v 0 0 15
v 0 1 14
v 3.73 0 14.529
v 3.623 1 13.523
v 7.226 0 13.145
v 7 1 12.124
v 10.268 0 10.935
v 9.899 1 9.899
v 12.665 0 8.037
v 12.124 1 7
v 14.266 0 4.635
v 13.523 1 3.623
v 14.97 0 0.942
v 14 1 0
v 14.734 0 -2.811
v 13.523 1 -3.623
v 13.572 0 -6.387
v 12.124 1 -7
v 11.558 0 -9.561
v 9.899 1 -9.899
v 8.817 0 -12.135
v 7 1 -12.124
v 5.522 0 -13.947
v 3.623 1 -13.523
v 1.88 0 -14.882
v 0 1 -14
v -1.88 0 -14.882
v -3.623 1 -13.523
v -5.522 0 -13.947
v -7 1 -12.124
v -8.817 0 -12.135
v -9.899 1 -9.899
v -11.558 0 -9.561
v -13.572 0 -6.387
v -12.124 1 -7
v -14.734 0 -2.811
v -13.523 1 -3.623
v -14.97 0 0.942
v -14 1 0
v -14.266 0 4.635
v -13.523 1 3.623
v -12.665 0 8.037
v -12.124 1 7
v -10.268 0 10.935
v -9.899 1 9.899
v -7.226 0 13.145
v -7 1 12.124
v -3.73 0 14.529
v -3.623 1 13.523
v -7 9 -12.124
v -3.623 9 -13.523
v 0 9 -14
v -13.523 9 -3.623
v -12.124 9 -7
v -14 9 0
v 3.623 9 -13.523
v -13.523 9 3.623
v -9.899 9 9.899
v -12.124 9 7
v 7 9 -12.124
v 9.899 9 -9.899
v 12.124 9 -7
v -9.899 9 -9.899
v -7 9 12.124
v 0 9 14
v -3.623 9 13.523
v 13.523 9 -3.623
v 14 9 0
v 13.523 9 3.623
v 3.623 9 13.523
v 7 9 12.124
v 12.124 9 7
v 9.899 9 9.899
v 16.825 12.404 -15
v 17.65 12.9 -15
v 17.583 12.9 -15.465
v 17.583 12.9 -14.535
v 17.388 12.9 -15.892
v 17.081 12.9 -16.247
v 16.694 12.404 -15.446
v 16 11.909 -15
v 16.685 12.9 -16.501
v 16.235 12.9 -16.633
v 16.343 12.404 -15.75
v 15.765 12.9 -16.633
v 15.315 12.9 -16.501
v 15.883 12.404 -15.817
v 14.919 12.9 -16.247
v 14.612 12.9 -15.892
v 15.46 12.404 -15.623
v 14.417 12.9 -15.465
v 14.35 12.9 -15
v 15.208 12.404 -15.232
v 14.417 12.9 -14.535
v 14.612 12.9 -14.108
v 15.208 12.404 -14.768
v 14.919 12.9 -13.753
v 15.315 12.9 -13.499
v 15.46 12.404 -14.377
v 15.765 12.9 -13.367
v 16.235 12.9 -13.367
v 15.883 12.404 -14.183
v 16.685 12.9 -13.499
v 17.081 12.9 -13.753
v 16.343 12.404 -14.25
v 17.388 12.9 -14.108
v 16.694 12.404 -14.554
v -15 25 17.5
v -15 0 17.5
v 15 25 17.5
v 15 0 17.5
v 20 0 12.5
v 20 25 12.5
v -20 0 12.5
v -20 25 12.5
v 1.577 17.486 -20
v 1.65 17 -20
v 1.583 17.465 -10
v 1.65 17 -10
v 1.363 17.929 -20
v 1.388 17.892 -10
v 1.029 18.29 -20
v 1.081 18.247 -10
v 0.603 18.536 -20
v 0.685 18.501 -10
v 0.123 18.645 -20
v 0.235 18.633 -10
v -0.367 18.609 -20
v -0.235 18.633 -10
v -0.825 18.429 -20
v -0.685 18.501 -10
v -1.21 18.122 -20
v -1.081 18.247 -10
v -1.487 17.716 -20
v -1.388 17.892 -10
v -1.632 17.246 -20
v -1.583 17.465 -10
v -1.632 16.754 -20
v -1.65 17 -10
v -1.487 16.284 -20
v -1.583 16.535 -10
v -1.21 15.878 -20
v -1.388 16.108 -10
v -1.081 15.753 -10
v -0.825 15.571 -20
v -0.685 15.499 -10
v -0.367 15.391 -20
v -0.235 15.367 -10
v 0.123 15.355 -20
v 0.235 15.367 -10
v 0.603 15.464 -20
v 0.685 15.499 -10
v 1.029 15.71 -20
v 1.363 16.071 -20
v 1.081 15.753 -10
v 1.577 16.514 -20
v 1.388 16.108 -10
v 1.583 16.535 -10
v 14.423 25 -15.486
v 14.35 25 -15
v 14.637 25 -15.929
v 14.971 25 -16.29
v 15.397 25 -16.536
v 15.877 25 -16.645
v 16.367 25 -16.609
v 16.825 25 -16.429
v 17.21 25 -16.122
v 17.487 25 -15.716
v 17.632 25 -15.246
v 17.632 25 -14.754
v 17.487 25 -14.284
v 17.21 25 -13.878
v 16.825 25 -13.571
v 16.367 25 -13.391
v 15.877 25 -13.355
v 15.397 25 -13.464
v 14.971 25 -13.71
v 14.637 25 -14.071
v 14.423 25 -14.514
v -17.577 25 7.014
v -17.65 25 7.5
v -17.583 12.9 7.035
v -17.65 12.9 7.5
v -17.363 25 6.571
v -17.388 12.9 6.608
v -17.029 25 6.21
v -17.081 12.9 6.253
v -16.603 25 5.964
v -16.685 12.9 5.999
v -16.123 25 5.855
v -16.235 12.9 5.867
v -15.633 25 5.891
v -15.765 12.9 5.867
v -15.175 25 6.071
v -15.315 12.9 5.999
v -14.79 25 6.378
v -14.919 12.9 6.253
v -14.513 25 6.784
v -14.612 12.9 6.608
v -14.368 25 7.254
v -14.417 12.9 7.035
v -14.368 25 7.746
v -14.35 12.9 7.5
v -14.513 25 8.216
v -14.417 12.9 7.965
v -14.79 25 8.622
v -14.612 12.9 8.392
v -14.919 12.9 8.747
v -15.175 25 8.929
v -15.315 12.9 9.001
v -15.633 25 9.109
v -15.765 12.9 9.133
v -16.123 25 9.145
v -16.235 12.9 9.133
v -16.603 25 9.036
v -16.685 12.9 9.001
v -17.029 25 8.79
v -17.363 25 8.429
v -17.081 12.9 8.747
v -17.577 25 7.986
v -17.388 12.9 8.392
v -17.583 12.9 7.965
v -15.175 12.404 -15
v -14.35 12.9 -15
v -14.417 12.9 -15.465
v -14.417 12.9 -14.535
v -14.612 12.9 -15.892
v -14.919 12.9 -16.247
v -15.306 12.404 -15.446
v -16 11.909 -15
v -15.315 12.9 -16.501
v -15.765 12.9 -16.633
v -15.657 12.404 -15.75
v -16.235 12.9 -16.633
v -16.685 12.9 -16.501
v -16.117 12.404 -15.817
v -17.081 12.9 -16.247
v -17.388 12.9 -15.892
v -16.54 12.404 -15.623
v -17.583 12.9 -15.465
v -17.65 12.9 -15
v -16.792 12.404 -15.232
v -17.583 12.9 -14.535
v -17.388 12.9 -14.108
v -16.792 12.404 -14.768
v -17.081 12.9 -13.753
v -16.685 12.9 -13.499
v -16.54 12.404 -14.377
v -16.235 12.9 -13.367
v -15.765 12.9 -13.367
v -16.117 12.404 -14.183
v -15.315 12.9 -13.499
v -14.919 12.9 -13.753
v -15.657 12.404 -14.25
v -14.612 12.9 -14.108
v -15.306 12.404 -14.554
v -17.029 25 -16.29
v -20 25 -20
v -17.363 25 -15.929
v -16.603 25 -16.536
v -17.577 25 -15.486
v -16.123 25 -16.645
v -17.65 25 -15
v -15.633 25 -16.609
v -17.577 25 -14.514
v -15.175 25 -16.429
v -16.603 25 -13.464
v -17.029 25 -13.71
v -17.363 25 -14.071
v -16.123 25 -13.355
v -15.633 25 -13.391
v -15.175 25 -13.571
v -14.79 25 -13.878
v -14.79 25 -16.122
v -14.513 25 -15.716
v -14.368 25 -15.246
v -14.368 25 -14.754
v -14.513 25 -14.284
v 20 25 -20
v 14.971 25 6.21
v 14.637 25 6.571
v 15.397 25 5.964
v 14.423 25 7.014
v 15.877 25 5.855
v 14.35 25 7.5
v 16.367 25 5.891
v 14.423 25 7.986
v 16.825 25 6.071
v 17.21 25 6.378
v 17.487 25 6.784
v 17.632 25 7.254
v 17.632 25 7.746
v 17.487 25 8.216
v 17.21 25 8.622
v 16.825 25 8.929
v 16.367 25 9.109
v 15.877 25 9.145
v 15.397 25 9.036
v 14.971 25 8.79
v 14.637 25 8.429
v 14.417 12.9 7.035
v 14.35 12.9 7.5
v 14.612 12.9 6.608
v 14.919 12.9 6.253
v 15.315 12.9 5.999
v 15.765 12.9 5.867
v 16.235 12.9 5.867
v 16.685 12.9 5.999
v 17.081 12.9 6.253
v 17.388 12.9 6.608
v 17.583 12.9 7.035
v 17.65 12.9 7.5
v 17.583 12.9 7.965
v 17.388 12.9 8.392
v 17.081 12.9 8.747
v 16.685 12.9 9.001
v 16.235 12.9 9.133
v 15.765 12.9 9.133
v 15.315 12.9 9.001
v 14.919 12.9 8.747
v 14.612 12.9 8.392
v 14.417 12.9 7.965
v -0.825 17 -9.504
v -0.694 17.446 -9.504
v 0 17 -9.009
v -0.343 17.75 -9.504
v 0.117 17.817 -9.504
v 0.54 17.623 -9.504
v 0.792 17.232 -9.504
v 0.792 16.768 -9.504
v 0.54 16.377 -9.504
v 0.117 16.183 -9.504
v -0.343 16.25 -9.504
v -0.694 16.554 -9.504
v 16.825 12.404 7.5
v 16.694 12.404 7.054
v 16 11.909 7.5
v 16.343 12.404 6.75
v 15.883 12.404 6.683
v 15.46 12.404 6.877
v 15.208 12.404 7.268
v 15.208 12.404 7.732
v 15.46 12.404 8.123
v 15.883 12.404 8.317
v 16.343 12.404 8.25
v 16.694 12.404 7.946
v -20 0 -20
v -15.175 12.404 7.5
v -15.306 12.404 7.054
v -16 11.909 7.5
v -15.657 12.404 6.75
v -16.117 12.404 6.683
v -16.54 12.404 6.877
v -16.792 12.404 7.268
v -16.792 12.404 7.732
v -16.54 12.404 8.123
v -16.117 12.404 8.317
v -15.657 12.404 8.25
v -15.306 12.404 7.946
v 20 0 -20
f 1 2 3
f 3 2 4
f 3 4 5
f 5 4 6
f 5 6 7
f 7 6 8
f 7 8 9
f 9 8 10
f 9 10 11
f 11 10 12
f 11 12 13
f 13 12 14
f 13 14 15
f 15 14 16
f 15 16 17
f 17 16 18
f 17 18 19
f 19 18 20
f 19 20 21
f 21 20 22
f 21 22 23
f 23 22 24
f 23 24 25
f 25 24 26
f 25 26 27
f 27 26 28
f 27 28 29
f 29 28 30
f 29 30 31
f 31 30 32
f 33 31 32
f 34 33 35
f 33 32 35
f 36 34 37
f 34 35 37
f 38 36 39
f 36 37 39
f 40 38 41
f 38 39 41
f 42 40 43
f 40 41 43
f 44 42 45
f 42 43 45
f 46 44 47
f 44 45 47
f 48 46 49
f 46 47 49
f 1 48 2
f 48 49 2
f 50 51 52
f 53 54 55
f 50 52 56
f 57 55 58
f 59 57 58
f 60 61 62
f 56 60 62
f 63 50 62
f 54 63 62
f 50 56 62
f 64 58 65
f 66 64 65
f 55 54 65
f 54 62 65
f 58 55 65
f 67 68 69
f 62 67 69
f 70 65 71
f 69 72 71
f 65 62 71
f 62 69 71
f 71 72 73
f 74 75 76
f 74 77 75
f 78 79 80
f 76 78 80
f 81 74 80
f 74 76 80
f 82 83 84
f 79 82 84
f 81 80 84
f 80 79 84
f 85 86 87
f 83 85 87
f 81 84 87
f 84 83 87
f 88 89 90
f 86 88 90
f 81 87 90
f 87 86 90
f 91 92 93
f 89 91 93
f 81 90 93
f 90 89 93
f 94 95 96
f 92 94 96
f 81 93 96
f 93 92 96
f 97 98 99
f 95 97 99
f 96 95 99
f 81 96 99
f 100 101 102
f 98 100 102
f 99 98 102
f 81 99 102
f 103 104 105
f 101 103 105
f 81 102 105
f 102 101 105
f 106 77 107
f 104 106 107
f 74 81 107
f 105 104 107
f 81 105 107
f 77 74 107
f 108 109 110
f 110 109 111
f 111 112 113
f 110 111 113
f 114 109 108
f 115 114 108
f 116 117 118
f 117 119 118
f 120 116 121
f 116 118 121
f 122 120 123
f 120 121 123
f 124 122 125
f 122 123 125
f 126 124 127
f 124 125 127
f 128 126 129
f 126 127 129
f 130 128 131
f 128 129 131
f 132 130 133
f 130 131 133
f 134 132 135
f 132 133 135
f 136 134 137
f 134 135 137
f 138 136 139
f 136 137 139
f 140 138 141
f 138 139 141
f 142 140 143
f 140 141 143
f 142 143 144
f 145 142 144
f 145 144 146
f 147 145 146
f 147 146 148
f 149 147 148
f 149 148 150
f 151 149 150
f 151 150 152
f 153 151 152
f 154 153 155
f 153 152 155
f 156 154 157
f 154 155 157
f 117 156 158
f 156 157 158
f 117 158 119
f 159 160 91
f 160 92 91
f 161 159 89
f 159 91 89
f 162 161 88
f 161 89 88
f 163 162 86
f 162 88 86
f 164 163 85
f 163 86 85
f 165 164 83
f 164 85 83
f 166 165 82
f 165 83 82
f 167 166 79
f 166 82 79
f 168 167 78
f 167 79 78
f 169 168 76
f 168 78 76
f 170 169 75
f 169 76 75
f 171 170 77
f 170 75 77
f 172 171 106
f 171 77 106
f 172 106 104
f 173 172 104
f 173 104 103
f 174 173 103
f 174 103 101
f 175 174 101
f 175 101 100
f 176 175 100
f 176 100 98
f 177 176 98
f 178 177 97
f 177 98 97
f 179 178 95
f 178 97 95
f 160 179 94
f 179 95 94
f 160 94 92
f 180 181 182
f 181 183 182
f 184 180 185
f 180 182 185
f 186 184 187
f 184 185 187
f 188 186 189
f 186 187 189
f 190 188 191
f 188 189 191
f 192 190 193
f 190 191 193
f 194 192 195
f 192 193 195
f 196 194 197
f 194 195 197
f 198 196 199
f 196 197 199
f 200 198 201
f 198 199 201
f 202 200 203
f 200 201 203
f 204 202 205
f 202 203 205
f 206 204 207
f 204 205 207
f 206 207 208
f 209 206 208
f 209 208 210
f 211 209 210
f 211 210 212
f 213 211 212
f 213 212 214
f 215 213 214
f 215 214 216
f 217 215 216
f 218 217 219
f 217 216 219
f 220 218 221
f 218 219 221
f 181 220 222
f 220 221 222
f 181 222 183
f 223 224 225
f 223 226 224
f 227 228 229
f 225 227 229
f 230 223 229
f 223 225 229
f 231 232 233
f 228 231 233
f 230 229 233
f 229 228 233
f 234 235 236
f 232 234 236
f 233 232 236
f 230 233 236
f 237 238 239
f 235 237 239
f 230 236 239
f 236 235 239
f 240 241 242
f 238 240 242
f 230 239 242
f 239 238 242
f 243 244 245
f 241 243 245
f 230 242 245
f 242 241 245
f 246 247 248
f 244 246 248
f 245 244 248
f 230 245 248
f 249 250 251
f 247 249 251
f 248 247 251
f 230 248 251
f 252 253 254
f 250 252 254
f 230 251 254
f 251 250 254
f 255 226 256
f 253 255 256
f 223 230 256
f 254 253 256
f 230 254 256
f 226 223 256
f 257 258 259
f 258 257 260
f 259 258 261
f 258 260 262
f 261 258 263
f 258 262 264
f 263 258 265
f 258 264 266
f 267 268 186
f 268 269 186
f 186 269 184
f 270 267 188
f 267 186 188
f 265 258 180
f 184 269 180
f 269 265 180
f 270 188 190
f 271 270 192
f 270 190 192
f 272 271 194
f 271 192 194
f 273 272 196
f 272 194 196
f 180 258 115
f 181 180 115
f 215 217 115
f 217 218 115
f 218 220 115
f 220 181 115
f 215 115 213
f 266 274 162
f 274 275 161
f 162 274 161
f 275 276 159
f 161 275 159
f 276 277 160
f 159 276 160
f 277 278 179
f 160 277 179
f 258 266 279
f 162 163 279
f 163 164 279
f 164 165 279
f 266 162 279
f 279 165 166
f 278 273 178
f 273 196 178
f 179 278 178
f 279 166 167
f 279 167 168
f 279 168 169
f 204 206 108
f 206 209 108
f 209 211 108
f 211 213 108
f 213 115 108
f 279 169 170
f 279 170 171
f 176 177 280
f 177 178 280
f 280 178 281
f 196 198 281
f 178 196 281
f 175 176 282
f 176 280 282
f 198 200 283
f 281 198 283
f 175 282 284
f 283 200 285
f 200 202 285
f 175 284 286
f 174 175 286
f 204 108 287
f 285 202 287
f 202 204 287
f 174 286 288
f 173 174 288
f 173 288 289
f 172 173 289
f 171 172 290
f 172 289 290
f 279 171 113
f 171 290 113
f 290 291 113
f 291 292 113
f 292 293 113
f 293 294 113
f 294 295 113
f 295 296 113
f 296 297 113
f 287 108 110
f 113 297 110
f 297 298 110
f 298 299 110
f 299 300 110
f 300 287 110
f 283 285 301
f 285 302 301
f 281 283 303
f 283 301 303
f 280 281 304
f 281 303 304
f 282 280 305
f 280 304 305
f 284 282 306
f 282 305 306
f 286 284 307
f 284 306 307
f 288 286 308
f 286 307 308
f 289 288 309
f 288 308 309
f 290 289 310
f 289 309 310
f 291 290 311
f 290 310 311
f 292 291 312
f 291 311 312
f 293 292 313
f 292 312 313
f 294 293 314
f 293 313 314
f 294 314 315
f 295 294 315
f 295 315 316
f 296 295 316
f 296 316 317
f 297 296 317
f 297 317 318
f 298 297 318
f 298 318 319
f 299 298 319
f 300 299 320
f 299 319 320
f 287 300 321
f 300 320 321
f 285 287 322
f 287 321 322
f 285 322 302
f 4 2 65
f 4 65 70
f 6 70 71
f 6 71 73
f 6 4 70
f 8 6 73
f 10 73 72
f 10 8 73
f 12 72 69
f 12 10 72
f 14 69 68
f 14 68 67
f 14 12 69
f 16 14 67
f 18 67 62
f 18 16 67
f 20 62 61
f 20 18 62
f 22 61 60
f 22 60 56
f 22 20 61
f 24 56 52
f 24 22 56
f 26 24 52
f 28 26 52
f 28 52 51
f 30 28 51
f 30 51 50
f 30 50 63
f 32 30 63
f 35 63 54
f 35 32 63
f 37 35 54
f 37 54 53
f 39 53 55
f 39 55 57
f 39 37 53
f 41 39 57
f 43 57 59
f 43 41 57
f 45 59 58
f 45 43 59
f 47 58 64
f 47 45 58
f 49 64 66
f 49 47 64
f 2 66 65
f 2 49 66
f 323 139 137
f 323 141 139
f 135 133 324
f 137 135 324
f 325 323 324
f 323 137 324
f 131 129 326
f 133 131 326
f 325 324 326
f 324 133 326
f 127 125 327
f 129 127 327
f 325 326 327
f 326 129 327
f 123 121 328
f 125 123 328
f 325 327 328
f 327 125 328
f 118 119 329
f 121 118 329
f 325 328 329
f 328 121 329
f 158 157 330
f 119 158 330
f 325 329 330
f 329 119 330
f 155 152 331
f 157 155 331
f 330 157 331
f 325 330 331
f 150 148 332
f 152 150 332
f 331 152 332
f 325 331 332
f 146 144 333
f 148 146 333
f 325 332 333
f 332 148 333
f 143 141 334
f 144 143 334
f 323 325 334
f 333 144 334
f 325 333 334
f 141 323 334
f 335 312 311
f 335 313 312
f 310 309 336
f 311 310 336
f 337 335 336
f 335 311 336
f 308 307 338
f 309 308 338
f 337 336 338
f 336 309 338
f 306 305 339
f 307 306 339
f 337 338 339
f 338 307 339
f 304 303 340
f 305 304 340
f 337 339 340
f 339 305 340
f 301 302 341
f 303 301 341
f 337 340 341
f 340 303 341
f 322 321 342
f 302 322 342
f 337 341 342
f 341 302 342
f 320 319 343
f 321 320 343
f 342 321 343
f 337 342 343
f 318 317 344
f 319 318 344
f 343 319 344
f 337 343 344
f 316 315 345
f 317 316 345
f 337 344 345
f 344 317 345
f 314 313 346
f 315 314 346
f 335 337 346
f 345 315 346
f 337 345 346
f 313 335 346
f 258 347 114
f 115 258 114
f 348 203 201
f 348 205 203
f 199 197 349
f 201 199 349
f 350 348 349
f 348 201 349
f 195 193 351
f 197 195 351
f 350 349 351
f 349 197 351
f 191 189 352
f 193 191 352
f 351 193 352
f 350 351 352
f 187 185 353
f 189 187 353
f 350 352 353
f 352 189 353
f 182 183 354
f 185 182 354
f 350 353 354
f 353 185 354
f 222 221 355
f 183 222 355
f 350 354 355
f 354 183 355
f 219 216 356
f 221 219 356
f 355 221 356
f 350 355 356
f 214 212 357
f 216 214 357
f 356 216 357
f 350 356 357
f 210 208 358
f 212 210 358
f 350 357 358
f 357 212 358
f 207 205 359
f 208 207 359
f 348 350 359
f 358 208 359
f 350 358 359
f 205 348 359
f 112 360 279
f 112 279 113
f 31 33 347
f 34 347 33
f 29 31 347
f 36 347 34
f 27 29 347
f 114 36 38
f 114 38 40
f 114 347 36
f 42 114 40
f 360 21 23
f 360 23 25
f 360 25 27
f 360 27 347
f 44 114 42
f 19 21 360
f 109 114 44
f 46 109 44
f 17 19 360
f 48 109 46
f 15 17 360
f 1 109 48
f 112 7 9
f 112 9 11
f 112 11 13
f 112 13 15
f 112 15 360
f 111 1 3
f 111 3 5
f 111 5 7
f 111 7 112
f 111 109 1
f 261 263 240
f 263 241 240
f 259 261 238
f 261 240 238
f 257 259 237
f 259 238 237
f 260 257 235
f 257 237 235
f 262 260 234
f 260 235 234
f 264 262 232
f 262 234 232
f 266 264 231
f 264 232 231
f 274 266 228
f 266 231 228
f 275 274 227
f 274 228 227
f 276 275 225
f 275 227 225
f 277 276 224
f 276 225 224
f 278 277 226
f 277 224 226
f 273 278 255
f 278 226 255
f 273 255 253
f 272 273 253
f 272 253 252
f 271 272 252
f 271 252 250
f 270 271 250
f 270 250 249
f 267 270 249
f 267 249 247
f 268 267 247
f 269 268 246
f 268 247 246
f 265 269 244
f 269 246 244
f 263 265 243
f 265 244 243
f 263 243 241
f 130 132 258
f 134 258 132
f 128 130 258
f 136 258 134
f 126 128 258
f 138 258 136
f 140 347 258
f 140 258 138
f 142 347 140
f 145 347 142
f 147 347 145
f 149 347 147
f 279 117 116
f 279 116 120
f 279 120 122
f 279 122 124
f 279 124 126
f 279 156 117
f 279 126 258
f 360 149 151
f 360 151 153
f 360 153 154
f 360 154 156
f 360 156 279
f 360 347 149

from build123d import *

# Parameters (mm, degrees)
SKETCH2_W             = 40
SKETCH2_H             = 32.5
BOSS_EXTRUDE1_DEPTH   = 25
SKETCH3_W             = 40
SKETCH3_H             = 5
BOSS_EXTRUDE2_DEPTH   = 25
SKETCH1_R             = 14
CUT_EXTRUDE1_DEPTH    = 9
CHAMFER1_SIZE         = 1
M4_TAPPED_HOLE2_D     = 3.3
M4_TAPPED_HOLE2_DEPTH = 10
M4_TAPPED_HOLE2_TIP   = 0.991420021
CHAMFER2_SIZE         = 5
M4_TAPPED_HOLE3_D     = 3.3
M4_TAPPED_HOLE3_DEPTH = 12.1
M4_TAPPED_HOLE3_TIP   = 0.991420021


with BuildPart() as part:
    # Sketch2 → Boss-Extrude1 (new body)
    with BuildSketch(Plane(origin=(0, 0, 0), x_dir=(1, 0, 0), z_dir=(0, 1, 0))):
        with Locations((0, 3.75)):
            Rectangle(SKETCH2_W, SKETCH2_H)
    extrude(amount=BOSS_EXTRUDE1_DEPTH)

    # Sketch3 → Boss-Extrude2 (add)
    with BuildSketch(Plane.XZ):
        with Locations((0, 15)):
            Rectangle(SKETCH3_W, SKETCH3_H)
    extrude(amount=-BOSS_EXTRUDE2_DEPTH)

    # Sketch1 → Cut-Extrude1 (cut)
    with BuildSketch(Plane(origin=(0, 0, 0), x_dir=(1, 0, 0), z_dir=(0, 1, 0))):
        with Locations(Location((0, 0, 0), (0, 0, 270))):
            Circle(SKETCH1_R)
    extrude(amount=CUT_EXTRUDE1_DEPTH, mode=Mode.SUBTRACT)

    # Chamfer1
    chamfer1_edges = [part.edges().sort_by_distance(p)[0] for p in [
        (0, 0, -14),
    ]]
    chamfer(chamfer1_edges, length=CHAMFER1_SIZE)

    # M4 Tapped Hole2
    with Locations(Plane(origin=(0, 0, -20), x_dir=(-1, 0, 0), z_dir=(0, 0, -1))):
        with Locations((0, 17)):
            Hole(M4_TAPPED_HOLE2_D / 2, depth=M4_TAPPED_HOLE2_DEPTH)
            with Locations((0, 0, -(M4_TAPPED_HOLE2_DEPTH + M4_TAPPED_HOLE2_TIP / 2))):  # 118° drill point
                Cone(0, M4_TAPPED_HOLE2_D / 2, M4_TAPPED_HOLE2_TIP, mode=Mode.SUBTRACT)

    # Chamfer2
    chamfer2_edges = [part.edges().sort_by_distance(p)[0] for p in [
        (20, 12.5, 17.5),
        (-20, 12.5, 17.5),
    ]]
    chamfer(chamfer2_edges, length=CHAMFER2_SIZE)

    # M4 Tapped Hole3
    with Locations(Plane(origin=(0, 25, 0), x_dir=(1, 0, 0), z_dir=(0, 1, 0))):
        with Locations((-16, 15), (-16, -7.5), (16, -7.5), (16, 15)):
            Hole(M4_TAPPED_HOLE3_D / 2, depth=M4_TAPPED_HOLE3_DEPTH)
            with Locations((0, 0, -(M4_TAPPED_HOLE3_DEPTH + M4_TAPPED_HOLE3_TIP / 2))):  # 118° drill point
                Cone(0, M4_TAPPED_HOLE3_D / 2, M4_TAPPED_HOLE3_TIP, mode=Mode.SUBTRACT)


solid = part.part
